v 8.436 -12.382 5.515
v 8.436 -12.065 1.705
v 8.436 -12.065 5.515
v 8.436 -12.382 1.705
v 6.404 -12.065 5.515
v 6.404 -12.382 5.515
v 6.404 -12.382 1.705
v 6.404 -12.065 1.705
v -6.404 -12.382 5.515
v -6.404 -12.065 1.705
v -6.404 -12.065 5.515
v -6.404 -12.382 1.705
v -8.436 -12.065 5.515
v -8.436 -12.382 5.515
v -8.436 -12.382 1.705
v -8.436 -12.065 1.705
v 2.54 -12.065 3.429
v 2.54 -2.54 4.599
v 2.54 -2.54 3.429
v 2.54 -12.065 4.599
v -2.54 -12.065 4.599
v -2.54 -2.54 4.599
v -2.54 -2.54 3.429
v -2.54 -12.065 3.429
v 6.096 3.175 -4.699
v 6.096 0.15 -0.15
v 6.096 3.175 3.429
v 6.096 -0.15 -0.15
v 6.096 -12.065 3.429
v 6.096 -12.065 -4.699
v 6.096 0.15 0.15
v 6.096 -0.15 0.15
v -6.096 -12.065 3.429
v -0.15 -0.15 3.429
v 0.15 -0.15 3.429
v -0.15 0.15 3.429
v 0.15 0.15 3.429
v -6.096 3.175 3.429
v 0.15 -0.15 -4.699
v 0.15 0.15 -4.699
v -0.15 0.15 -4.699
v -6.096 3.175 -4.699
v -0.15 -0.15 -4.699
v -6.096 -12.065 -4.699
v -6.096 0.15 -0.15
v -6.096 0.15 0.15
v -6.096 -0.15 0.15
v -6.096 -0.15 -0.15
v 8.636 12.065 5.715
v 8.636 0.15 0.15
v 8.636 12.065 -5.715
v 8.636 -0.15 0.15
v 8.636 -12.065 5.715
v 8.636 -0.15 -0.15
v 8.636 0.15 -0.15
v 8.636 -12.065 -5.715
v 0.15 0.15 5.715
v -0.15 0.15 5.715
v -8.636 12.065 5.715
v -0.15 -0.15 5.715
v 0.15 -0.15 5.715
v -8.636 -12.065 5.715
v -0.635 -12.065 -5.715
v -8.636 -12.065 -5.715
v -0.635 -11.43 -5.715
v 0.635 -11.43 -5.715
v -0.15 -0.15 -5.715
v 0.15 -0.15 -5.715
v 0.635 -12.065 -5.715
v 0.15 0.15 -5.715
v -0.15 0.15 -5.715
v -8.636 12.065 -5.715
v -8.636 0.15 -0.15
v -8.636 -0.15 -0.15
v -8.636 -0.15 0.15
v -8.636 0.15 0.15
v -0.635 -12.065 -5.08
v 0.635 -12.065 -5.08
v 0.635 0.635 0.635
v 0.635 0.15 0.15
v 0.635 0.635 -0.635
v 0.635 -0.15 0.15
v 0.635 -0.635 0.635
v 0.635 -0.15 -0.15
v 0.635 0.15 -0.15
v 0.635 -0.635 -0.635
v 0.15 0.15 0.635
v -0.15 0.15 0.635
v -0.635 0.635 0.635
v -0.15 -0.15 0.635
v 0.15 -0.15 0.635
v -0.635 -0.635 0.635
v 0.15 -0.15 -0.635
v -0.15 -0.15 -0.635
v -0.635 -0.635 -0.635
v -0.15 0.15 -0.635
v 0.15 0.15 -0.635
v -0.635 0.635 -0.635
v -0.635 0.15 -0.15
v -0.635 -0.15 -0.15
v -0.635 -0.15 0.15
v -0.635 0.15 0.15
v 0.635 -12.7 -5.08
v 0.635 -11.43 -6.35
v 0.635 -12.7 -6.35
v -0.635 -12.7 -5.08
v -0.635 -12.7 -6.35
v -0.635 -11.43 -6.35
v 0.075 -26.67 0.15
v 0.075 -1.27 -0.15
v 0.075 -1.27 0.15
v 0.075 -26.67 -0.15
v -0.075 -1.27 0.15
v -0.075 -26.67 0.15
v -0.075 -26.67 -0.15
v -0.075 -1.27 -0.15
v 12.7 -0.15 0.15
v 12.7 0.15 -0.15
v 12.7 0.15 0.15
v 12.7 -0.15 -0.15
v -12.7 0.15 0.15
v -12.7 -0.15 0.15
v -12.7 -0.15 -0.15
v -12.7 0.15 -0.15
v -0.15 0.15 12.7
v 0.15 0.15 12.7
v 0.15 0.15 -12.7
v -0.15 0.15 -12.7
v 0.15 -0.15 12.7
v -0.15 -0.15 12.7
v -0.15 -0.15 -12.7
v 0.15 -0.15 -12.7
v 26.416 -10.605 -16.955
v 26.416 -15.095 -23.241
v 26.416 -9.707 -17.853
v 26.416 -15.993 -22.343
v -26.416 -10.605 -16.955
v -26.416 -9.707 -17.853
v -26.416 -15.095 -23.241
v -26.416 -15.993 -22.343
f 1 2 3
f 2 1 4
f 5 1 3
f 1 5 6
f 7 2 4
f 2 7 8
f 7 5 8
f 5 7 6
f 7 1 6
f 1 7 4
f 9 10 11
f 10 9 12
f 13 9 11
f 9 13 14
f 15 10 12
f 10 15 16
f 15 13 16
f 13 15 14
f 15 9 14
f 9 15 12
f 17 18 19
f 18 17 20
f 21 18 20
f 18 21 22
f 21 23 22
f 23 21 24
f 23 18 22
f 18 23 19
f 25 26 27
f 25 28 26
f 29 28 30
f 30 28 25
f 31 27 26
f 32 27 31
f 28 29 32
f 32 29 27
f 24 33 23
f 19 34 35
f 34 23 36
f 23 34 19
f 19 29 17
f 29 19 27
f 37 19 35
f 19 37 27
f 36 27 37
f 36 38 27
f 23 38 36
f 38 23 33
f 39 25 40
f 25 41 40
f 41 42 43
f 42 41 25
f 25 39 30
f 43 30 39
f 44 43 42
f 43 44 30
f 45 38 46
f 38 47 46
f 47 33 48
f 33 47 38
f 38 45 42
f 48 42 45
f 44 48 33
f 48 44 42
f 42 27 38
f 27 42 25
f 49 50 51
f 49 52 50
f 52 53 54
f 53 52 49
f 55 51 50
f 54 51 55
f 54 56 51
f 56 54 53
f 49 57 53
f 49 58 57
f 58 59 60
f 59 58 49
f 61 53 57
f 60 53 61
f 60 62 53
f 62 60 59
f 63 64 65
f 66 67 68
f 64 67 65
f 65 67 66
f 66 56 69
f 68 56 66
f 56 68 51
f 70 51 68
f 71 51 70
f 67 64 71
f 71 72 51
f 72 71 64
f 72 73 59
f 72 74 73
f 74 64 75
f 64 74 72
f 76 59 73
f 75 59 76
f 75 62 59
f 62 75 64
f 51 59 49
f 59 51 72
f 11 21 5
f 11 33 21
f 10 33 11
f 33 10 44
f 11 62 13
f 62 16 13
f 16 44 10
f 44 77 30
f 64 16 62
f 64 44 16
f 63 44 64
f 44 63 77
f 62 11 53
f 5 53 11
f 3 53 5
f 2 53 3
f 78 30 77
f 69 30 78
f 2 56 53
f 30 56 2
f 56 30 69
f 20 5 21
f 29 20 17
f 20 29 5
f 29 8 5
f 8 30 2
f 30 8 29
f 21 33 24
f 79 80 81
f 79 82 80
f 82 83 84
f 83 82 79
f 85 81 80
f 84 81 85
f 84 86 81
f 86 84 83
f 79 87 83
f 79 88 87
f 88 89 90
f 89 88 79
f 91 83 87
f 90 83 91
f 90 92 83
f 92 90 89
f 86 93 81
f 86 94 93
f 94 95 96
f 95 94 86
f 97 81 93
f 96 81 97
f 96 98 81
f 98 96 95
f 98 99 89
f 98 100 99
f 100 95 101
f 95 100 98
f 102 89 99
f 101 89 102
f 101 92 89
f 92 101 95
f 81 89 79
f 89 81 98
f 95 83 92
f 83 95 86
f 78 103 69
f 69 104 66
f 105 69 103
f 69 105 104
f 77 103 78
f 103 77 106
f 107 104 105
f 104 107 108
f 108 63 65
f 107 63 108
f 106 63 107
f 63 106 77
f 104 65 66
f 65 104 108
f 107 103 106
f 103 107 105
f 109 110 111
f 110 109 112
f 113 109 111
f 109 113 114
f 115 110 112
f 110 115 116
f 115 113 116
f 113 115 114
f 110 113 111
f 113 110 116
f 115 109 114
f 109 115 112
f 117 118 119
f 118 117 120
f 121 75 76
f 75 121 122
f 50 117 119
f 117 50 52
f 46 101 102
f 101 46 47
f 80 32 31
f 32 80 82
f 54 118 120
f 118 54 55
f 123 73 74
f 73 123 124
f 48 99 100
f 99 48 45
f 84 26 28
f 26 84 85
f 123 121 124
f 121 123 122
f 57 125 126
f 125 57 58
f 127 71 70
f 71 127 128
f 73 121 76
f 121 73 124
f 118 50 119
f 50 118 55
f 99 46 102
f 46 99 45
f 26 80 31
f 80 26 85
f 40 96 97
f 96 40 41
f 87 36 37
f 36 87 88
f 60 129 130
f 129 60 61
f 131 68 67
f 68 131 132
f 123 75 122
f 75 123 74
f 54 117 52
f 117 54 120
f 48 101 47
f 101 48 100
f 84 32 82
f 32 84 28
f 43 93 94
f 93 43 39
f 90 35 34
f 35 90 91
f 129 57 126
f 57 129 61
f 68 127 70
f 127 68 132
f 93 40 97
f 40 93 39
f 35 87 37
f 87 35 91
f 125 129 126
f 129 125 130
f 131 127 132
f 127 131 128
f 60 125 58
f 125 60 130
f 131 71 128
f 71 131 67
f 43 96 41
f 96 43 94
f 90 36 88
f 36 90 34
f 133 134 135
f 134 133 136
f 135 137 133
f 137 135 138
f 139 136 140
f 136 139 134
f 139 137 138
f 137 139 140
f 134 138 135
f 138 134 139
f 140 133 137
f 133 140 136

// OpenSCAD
include <../mo/mo.scad>

moRJ45Socket_Height = 0.95 * in;
moRJ45Socket_Width = 0.68 * in;
moRJ45Socket_Depth = 0.45 * in;
moRJ45Socket_SideWall = 0.1 * in;
moRJ45Socket_BottomWall = 0.05 * in;
moRJ45Socket_TopWall = 0.08 * in;
moRJ45Socket_BackWall = 0.35 * in;
moRJ45Socket_TabHeight = 0.6 * in;
moRJ45Socket_TabDepth = 0.05* in;
moRJ45Socket_TabWidth = 0.2 * in;
moRJ45Socket_LEDHeight = 0.025 * in;
moRJ45Socket_LEDDepth = 0.15 * in;
moRJ45Socket_LEDWidth = 0.08 * in;

positions = [ 
  [ [ 0, 0, 0 ], [ 0, 0, 1 ], 0 ],
  [ [ 0, -moRJ45Socket_Height/2, -moRJ45Socket_Depth/2 ], [ 1, 0, 0 ], 0 ]
];

module moRJ45Socket( p = 0, info = false ) {
  moPresent( positions, p, info ) {
    // USB Connector
     color( Black ) {
        translate( [ moRJ45Socket_Width/2-moRJ45Socket_LEDWidth/2-2*Epsilon, -moRJ45Socket_Height/2, moRJ45Socket_Depth/2-moRJ45Socket_LEDDepth/2-2*Epsilon ] ) 
          cube( [ moRJ45Socket_LEDWidth, moRJ45Socket_LEDHeight, moRJ45Socket_LEDDepth ], center = true );
        translate( [ -moRJ45Socket_Width/2+moRJ45Socket_LEDWidth/2+2*Epsilon, -moRJ45Socket_Height/2, moRJ45Socket_Depth/2-moRJ45Socket_LEDDepth/2-2*Epsilon ] ) 
          cube( [ moRJ45Socket_LEDWidth, moRJ45Socket_LEDHeight, moRJ45Socket_LEDDepth ], center = true );
       }
     color( Aluminum ) {
      difference() {
        cube( [ moRJ45Socket_Width, moRJ45Socket_Height, moRJ45Socket_Depth ], center = true );
        translate( [ 0, -moRJ45Socket_BackWall, -moRJ45Socket_BottomWall/2 ] ) {
          translate( [ 0, -0.05*in, moRJ45Socket_Depth / 2 - moRJ45Socket_TopWall/2 - Epsilon ] )
              cube( [ moRJ45Socket_TabWidth, 
                      moRJ45Socket_TabHeight, 
                      moRJ45Socket_TabDepth ], center = true );
          cube( [ moRJ45Socket_Width - 2 * moRJ45Socket_SideWall, 
                  moRJ45Socket_Height, 
                  moRJ45Socket_Depth - moRJ45Socket_TopWall - moRJ45Socket_BottomWall ], center = true );
        }
        }
      }
    
  }
}


function moRJ45SocketPosition( p = 0 ) = positions[ p ];

moMoveOriginTo( moRJ45SocketPosition( 0 ) ) {
  moRJ45Socket( 0, info = true, $name = true );
}
